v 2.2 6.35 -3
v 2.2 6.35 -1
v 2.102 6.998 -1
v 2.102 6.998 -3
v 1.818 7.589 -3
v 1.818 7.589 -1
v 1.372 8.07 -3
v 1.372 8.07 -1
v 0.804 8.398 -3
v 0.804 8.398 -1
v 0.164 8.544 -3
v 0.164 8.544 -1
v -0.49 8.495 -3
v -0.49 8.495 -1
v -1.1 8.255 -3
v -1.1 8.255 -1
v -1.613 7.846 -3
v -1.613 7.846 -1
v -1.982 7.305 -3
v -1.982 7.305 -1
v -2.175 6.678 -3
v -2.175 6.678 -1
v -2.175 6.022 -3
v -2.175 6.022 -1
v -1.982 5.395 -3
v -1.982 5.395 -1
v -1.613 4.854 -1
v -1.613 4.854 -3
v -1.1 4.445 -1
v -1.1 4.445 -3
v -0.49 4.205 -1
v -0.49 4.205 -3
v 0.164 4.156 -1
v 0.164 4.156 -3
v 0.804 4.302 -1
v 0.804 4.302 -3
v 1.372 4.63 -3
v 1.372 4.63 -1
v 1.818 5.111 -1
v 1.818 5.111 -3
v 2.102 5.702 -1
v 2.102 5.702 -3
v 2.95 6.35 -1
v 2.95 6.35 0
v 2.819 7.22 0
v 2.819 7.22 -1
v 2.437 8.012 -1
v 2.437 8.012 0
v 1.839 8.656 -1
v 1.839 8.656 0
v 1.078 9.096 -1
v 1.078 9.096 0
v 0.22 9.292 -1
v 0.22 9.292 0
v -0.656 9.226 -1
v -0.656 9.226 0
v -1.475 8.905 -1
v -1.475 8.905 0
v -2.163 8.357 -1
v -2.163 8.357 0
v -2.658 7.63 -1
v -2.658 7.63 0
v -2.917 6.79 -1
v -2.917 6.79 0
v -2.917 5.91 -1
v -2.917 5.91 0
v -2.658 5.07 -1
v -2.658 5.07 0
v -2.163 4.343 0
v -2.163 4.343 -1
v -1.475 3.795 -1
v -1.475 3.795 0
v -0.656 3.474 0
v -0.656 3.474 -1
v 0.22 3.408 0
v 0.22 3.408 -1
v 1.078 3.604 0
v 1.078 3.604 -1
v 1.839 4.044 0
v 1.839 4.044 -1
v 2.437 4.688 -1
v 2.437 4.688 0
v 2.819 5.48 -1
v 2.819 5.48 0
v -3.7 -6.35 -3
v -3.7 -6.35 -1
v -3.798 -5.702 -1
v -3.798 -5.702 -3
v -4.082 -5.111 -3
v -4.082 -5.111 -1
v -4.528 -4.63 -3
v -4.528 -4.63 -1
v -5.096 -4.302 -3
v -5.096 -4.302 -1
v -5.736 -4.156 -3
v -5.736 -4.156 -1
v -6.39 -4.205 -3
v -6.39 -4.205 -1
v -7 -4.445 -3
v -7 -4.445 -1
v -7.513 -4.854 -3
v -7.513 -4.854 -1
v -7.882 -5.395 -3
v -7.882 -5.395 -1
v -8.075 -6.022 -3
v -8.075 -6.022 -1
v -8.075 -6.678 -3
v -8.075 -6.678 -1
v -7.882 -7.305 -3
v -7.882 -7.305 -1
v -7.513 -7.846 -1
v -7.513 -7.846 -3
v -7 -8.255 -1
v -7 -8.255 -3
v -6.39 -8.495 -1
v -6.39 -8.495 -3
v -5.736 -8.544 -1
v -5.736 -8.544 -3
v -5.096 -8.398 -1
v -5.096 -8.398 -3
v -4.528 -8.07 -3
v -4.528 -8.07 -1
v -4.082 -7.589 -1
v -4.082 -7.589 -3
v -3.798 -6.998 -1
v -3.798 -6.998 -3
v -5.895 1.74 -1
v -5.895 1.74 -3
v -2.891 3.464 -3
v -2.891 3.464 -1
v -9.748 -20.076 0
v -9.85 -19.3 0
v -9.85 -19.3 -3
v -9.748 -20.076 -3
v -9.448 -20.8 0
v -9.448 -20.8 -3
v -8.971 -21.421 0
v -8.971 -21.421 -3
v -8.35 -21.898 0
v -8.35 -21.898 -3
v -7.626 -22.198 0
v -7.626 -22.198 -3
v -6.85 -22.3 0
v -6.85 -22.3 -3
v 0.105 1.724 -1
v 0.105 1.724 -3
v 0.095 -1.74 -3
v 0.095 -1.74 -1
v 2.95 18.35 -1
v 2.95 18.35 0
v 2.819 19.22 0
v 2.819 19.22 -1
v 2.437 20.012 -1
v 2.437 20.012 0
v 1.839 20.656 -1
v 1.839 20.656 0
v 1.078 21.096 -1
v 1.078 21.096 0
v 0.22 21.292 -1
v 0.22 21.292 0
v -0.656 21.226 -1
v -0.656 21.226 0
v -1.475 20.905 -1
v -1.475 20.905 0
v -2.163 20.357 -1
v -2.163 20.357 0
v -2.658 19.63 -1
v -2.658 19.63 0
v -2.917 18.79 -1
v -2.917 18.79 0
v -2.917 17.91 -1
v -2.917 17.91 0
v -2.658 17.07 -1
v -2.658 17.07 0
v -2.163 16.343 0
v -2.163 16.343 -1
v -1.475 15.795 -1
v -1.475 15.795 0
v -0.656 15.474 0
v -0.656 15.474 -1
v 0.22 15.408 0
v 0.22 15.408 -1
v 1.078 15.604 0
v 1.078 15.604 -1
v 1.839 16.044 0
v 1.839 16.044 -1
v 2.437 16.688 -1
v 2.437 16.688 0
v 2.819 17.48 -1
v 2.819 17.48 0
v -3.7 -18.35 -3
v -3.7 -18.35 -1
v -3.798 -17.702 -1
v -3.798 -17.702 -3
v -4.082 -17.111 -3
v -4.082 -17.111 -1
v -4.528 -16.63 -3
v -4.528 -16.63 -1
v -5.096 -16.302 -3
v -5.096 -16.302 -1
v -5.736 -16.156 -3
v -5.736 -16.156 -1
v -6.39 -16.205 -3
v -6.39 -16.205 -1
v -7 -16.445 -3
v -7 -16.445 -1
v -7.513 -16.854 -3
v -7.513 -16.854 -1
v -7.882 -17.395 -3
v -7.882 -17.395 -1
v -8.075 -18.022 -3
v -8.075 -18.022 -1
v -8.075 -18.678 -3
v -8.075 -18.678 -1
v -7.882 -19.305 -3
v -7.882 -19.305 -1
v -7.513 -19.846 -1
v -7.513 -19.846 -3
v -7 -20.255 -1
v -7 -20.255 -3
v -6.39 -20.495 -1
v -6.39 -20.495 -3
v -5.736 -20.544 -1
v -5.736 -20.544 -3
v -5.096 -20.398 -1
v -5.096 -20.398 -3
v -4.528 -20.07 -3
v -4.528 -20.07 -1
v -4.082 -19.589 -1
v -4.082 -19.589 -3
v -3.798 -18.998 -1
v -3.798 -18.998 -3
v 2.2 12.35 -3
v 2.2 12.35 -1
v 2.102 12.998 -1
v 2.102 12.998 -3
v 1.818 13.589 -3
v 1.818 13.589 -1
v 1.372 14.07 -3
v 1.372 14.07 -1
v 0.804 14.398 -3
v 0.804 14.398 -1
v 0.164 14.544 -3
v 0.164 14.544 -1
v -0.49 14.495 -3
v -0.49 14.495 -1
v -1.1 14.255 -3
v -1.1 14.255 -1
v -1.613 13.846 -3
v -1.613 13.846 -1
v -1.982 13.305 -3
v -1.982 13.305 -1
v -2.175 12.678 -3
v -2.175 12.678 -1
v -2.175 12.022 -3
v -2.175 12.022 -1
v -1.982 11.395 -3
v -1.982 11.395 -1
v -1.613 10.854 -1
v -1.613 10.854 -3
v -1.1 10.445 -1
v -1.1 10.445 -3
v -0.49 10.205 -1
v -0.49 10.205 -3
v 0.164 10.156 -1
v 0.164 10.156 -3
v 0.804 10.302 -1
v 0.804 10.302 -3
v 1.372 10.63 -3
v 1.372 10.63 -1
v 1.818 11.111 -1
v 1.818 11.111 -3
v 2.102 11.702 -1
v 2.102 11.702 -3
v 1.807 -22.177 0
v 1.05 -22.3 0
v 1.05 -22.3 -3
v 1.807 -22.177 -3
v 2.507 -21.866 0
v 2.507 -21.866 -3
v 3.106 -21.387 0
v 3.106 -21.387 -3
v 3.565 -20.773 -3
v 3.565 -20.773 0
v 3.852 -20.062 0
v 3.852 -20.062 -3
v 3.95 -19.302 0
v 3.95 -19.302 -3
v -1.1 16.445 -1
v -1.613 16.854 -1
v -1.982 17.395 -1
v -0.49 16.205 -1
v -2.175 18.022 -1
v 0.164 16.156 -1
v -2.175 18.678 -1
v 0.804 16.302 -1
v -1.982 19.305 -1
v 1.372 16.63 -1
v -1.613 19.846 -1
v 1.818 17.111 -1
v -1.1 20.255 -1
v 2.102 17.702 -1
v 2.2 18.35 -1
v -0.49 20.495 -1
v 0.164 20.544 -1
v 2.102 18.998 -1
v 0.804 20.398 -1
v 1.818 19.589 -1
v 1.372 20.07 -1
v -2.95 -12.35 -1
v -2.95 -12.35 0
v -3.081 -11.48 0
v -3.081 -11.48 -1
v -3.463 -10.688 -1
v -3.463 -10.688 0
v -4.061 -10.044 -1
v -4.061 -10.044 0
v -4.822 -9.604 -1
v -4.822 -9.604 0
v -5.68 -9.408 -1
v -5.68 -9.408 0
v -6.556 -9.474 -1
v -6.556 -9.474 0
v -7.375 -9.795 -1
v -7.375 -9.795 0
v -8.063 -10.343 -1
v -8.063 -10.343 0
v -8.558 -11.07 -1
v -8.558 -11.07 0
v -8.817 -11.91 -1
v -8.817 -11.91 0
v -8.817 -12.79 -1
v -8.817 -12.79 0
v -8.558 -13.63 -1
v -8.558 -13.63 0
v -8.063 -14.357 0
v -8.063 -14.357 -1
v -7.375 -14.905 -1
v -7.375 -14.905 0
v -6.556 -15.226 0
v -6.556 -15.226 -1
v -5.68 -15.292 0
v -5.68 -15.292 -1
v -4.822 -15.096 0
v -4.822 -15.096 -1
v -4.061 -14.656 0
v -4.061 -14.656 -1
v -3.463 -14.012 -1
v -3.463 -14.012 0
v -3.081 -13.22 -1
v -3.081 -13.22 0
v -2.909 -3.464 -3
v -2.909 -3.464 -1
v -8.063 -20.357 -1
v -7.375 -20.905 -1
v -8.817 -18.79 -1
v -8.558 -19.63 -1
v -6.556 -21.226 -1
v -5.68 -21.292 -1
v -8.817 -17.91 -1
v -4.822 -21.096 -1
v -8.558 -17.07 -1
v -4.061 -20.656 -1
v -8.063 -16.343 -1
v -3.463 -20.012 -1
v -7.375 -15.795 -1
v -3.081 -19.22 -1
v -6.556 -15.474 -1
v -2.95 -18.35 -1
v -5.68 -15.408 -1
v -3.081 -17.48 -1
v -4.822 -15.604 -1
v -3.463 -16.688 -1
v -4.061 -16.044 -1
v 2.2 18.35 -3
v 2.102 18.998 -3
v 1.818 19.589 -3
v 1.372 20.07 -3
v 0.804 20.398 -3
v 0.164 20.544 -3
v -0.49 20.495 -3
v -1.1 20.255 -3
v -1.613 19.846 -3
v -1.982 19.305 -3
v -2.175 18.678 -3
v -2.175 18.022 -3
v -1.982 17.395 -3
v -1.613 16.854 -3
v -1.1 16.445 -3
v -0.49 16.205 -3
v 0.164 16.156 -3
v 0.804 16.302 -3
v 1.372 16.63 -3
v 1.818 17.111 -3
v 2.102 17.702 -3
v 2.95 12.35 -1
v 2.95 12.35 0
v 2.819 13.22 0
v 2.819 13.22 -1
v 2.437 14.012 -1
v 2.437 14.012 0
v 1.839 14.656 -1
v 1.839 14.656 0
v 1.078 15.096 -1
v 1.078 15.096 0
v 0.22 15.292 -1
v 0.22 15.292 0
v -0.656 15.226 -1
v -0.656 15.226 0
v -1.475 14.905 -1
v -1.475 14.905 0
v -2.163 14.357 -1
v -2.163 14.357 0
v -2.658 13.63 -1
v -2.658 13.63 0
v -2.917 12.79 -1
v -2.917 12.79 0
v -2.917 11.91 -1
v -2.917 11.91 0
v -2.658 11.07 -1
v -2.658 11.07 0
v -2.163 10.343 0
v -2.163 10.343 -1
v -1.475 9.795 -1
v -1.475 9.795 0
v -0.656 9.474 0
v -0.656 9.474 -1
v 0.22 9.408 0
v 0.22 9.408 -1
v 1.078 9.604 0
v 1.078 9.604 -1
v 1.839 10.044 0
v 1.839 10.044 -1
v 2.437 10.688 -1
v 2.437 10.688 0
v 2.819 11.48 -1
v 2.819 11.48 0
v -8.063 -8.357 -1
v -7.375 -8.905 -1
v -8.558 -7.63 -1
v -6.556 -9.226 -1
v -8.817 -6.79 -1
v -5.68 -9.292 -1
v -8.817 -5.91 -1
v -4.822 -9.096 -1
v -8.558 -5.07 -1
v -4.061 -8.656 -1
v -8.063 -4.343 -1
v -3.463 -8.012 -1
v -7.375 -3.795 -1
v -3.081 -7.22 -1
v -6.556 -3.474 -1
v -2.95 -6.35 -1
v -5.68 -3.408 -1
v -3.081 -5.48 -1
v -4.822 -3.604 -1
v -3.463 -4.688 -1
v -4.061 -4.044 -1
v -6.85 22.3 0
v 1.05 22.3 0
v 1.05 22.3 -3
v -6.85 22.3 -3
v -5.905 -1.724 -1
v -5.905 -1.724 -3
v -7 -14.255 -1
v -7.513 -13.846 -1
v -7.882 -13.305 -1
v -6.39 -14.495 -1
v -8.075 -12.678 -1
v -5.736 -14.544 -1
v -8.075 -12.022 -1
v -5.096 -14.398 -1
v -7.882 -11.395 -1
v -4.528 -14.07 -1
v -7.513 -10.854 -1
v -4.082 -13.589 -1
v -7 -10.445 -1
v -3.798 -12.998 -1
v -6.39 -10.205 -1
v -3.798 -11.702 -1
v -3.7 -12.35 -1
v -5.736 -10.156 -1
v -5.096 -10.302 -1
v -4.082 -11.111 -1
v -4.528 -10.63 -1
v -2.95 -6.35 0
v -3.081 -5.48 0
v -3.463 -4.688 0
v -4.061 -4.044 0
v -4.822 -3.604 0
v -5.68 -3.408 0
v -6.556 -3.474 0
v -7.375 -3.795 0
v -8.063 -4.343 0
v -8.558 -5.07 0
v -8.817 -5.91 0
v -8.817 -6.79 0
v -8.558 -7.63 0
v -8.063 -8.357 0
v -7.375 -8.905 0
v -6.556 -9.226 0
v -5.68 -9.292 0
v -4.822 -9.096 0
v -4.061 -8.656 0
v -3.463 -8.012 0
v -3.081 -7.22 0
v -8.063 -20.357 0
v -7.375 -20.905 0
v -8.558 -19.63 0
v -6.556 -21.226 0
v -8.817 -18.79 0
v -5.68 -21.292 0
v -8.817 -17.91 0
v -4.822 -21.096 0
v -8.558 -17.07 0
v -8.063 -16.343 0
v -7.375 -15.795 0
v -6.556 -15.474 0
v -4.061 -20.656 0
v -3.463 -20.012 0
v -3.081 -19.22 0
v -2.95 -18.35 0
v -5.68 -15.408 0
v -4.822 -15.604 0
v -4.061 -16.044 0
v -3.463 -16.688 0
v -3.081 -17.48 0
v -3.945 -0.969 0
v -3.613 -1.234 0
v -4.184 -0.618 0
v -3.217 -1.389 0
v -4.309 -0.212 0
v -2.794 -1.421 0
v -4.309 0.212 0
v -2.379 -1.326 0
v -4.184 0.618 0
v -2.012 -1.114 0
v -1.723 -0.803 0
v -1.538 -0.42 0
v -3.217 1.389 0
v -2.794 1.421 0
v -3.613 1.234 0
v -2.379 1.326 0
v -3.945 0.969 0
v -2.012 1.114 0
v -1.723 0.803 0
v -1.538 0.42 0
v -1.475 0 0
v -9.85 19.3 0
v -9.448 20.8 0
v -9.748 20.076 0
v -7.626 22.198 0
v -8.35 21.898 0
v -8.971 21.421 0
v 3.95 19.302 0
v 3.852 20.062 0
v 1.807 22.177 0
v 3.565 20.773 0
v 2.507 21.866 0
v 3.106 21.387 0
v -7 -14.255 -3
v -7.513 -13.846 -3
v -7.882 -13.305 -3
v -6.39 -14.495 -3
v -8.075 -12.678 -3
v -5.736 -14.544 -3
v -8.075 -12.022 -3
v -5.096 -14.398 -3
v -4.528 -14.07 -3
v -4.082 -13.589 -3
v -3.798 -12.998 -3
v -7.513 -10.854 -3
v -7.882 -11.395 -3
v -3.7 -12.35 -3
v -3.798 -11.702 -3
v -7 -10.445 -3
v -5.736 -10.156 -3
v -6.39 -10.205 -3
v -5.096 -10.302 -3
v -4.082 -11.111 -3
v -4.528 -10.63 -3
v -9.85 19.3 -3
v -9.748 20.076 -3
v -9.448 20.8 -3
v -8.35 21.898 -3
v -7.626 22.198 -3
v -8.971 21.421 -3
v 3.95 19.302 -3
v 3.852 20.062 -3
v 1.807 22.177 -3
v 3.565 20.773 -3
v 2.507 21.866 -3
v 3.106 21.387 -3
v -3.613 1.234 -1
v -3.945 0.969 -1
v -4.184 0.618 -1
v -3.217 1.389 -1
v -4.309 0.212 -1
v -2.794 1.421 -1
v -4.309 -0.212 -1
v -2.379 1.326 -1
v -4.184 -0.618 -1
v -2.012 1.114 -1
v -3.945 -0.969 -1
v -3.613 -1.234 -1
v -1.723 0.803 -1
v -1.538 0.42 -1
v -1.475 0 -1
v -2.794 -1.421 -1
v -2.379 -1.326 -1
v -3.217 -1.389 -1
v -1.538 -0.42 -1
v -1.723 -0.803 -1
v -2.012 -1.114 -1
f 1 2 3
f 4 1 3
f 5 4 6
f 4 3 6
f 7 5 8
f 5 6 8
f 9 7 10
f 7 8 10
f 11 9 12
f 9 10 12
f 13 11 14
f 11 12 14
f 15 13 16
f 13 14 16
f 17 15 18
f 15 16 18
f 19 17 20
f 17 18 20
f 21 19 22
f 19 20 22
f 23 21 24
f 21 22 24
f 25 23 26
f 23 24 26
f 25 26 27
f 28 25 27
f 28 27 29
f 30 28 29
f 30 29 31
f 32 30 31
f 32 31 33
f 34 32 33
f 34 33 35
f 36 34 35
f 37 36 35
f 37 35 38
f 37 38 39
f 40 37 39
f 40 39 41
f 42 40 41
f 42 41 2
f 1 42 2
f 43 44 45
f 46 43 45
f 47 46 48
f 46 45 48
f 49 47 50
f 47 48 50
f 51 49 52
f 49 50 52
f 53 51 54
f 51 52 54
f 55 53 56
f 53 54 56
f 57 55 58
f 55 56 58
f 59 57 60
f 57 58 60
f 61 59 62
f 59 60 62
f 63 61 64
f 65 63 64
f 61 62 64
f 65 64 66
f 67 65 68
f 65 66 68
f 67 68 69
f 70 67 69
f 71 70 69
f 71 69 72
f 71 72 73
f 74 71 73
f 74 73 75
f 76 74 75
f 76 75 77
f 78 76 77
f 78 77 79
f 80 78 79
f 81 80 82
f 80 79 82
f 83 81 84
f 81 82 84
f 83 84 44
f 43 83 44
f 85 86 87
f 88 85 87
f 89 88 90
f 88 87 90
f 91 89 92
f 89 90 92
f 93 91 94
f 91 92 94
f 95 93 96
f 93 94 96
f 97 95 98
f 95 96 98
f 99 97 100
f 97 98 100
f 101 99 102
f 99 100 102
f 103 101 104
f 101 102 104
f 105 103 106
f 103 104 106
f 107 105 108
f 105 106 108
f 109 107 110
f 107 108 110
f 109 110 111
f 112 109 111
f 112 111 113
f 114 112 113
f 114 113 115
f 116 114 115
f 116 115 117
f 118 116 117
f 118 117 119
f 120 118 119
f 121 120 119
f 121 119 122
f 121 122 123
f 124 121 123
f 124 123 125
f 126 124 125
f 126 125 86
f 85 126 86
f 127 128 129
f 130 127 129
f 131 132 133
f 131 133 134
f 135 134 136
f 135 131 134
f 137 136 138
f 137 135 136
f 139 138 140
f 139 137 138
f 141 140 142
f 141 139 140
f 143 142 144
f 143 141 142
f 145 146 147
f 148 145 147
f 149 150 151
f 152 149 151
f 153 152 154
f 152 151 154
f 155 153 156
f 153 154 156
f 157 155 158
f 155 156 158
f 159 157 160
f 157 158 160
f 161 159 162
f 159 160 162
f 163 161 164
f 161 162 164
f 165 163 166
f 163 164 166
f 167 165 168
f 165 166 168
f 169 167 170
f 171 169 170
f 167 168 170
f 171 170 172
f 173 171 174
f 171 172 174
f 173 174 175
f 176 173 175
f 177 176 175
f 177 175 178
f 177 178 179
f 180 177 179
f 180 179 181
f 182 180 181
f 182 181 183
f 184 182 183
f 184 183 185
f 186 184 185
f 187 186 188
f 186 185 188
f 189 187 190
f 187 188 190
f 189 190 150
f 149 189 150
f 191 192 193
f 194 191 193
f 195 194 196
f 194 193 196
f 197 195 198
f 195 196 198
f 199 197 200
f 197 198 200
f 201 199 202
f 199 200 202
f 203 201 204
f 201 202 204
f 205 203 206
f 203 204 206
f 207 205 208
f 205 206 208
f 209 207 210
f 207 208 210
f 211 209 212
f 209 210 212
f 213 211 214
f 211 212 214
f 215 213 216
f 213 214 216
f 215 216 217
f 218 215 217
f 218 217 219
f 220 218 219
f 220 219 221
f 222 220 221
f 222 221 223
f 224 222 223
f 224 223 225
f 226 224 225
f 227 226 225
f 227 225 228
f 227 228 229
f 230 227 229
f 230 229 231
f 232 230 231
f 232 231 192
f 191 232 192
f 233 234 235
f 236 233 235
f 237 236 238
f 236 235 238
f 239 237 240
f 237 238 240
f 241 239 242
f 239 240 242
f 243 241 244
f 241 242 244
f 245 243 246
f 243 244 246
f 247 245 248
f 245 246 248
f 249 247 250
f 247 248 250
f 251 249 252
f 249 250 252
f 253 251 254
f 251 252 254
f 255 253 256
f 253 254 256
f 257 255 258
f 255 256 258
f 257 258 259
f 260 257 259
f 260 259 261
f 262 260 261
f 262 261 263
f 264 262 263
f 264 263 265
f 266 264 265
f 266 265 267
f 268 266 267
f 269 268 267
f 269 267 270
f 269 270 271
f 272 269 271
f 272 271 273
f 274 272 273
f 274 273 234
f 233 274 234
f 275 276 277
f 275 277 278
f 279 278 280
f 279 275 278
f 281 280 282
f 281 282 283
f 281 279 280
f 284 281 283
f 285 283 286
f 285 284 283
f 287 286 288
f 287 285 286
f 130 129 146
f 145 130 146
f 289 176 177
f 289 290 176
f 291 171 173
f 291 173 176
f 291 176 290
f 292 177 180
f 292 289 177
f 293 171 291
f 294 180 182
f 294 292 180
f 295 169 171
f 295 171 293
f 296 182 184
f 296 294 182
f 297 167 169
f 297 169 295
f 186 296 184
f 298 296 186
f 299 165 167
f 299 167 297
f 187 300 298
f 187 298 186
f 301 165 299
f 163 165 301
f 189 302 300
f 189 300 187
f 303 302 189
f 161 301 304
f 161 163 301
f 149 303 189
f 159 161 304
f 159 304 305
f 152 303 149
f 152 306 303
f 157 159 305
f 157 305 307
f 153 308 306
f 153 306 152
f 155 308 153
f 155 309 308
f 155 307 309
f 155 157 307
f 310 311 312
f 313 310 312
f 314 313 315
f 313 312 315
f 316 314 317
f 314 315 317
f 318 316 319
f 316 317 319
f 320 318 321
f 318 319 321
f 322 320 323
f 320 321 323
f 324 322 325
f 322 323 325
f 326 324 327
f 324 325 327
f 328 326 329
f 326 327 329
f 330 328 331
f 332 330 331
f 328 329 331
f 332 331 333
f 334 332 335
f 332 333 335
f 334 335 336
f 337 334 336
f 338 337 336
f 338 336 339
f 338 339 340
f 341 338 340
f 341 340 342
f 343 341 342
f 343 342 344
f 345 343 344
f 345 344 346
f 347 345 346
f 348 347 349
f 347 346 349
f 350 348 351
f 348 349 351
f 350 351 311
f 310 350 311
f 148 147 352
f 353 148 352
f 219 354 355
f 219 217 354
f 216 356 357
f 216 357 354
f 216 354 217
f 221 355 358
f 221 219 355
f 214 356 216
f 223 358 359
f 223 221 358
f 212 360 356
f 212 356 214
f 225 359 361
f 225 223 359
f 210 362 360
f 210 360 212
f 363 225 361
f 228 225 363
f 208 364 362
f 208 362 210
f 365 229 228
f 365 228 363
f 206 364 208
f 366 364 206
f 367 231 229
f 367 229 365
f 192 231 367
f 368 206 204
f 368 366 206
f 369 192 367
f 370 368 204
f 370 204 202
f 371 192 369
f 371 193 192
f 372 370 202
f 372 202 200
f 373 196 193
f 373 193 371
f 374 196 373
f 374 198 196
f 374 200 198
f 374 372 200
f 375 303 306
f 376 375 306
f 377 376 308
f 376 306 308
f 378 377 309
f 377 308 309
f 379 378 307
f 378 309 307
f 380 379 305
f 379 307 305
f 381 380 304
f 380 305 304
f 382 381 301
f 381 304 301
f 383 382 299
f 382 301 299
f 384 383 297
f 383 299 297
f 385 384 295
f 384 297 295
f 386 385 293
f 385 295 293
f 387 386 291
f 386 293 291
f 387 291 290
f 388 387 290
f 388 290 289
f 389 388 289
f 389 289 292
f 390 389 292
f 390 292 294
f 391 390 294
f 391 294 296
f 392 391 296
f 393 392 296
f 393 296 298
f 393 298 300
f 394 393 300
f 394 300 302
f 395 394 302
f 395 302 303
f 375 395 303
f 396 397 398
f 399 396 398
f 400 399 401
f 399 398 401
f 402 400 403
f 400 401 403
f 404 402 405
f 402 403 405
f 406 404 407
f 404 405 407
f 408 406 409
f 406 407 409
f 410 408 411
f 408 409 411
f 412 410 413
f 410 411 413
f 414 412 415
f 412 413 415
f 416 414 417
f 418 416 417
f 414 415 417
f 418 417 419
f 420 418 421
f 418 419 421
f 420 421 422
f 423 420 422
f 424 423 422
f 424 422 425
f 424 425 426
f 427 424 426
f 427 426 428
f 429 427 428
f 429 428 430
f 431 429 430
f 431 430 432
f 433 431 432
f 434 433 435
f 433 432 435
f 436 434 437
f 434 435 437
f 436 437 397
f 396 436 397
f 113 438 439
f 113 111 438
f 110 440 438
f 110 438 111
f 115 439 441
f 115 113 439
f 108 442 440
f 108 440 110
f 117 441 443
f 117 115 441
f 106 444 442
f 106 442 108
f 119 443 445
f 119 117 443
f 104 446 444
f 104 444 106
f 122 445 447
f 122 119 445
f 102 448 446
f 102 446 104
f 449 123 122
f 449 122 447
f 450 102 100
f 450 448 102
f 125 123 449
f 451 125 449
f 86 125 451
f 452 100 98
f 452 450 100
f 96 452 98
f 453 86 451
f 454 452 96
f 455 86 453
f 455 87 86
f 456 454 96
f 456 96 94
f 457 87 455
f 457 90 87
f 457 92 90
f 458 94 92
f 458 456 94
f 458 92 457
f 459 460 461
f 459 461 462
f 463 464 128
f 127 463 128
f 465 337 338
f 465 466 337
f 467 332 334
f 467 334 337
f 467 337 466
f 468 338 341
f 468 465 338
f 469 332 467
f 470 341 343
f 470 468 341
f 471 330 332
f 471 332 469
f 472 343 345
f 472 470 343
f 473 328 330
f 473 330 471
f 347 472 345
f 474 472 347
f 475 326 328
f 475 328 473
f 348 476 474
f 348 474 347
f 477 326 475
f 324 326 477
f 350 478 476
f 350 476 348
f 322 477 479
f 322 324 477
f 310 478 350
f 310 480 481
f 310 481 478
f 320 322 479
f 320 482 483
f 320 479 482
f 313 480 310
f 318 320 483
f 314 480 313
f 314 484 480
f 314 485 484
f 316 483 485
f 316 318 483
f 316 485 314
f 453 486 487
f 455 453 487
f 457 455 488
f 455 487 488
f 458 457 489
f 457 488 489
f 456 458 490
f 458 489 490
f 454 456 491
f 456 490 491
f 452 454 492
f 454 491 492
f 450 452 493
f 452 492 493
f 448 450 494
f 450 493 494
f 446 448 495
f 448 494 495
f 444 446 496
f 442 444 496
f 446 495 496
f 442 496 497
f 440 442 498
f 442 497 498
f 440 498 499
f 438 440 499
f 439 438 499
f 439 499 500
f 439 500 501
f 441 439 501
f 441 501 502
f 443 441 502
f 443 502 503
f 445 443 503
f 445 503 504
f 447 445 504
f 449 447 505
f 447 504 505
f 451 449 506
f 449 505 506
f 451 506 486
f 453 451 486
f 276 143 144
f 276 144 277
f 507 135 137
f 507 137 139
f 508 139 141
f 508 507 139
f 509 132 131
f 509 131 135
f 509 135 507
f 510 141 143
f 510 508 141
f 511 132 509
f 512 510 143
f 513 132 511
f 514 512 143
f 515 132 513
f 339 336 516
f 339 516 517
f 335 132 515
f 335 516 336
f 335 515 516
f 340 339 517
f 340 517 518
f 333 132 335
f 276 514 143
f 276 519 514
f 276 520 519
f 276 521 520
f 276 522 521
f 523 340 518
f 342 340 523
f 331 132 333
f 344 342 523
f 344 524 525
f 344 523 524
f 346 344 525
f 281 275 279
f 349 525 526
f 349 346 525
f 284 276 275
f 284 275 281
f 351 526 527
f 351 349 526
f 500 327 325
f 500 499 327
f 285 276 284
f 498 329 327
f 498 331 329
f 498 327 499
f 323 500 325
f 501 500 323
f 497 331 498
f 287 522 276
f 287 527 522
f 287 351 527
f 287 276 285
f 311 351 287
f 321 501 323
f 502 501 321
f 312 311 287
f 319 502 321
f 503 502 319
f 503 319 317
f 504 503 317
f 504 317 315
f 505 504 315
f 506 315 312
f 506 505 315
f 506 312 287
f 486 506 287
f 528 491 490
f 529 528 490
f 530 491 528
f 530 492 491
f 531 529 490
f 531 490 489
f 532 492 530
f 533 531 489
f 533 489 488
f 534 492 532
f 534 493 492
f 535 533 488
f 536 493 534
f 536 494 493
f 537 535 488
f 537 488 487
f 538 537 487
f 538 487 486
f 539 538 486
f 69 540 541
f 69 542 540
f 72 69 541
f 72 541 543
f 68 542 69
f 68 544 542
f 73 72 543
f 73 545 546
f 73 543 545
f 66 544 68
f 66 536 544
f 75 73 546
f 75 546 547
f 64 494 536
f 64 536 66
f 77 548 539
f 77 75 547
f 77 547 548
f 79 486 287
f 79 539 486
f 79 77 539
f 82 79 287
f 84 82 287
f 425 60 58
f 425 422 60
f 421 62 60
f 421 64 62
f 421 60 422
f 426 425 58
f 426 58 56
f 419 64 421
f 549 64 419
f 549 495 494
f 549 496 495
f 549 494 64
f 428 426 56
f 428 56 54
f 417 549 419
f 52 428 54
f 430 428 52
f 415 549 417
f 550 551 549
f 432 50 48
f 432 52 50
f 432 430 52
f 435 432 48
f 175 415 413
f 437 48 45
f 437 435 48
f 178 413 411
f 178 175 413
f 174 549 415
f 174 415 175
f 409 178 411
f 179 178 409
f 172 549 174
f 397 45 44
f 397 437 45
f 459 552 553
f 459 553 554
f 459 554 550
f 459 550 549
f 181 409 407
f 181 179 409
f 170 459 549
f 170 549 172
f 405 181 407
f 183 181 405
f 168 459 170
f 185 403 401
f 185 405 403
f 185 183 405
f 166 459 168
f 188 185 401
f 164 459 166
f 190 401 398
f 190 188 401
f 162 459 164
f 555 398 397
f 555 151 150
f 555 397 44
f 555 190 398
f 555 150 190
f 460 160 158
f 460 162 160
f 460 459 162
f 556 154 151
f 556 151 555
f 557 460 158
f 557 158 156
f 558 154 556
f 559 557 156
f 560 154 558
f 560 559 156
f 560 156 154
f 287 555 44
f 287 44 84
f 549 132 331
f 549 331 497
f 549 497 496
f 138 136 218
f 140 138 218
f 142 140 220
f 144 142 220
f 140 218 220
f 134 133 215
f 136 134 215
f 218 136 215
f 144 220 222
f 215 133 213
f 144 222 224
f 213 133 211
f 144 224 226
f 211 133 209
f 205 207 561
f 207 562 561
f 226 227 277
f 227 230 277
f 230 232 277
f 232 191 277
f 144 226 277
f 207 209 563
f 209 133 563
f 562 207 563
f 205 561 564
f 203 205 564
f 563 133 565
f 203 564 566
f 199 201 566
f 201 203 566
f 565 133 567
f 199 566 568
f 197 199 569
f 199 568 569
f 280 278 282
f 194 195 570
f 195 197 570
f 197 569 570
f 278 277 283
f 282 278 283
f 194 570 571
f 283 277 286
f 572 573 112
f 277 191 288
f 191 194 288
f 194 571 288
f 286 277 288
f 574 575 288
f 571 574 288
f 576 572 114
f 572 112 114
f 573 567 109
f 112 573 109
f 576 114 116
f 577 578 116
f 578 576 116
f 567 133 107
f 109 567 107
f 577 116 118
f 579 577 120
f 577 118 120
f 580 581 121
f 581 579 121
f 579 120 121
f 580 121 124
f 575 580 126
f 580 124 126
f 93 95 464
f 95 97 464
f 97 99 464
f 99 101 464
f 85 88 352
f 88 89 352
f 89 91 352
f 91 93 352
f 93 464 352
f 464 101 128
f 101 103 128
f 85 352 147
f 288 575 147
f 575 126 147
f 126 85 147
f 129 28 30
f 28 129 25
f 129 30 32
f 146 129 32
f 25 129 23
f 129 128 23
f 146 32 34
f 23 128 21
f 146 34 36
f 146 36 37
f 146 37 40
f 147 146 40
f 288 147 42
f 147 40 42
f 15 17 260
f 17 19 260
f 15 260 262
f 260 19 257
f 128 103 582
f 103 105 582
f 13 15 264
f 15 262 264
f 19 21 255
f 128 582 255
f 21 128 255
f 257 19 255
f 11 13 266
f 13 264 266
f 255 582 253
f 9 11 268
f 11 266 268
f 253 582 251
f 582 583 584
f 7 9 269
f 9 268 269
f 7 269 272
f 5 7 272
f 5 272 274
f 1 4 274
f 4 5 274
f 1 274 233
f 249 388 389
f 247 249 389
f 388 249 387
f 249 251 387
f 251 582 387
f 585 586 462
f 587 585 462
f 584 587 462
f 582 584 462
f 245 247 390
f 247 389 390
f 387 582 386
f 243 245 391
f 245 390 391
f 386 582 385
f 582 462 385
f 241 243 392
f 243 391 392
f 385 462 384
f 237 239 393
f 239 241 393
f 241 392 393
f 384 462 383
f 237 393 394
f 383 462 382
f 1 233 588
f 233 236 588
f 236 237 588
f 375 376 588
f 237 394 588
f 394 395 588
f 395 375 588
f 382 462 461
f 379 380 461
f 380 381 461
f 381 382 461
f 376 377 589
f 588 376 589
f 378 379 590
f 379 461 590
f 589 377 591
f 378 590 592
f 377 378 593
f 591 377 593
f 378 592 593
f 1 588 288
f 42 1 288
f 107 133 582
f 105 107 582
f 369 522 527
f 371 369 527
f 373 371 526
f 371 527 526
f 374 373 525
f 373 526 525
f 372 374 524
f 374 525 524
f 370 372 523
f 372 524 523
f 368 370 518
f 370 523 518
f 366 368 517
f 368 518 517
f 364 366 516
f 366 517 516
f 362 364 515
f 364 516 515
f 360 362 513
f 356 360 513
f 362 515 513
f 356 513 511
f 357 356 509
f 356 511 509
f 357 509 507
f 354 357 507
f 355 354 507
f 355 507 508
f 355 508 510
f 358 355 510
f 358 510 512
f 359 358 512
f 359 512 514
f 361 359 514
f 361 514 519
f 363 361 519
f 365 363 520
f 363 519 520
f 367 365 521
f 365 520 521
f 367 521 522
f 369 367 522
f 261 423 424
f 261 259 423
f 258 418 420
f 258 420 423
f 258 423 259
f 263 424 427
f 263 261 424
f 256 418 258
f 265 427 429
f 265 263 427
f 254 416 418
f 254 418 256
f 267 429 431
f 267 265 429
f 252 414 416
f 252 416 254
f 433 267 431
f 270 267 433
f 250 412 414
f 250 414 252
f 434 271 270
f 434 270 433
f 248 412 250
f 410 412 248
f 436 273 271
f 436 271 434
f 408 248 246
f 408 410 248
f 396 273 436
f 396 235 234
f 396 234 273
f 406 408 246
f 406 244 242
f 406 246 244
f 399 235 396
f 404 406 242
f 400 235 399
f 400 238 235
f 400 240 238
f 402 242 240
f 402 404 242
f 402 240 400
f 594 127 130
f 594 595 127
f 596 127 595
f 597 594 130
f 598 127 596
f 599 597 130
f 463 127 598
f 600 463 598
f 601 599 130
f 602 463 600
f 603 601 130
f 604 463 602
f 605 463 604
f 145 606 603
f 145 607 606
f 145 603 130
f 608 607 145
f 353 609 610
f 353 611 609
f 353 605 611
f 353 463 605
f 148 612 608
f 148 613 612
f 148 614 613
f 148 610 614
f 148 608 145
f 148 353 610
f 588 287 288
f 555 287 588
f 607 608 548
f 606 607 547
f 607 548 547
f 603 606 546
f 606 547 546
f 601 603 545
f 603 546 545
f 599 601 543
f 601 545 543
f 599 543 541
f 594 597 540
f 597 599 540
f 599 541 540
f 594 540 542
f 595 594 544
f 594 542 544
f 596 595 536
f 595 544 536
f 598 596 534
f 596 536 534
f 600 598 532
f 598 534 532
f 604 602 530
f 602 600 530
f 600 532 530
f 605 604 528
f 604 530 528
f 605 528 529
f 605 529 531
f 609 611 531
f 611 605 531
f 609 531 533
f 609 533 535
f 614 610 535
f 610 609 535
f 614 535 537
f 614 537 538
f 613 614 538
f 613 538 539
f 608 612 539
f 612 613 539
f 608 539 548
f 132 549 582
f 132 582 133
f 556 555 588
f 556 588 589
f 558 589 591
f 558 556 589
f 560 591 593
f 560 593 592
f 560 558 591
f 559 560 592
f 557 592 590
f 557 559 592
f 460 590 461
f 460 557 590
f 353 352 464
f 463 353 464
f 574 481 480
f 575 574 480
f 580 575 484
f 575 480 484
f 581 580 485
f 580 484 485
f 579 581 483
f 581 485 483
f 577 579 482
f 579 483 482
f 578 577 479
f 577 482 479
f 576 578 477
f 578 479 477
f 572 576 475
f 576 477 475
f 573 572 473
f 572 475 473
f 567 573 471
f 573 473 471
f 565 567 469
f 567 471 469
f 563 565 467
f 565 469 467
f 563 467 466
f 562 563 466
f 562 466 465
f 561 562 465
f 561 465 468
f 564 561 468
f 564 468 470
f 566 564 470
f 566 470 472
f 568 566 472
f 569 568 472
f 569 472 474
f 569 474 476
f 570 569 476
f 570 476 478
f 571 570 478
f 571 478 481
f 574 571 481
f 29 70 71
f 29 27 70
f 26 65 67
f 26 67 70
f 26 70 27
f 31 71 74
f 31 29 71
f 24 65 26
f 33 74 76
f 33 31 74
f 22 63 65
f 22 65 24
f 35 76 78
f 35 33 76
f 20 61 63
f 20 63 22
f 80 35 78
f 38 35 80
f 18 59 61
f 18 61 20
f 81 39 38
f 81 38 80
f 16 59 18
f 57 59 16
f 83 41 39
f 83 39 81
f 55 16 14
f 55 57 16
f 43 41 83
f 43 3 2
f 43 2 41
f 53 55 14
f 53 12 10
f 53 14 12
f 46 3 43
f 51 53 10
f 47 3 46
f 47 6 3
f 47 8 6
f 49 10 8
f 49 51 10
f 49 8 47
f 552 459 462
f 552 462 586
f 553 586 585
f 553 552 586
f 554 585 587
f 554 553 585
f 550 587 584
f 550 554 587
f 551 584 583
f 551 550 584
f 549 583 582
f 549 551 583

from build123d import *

# Parameters (mm, degrees)
F0_R     = 2.95
F0_R_2   = 2.2
F0_R_3   = 1.425
F1_DEPTH = 3
F2_DEPTH = 1
F3_R     = 1.425
F4_DEPTH = 2


with BuildPart() as f1:
    # F0 (on Top) → F1 (new body)
    with BuildSketch(Plane.XY):
        with BuildLine():
            Line((3.95, -19.301667), (3.95, 0))
            Line((3.95, 0), (3.95, 19.301667))
            ThreePointArc((3.95, 19.301667), (3.106386, 21.387332), (1.05, 22.3))
            Line((1.05, 22.3), (-6.85, 22.3))
            ThreePointArc((-6.85, 22.3), (-8.97132, 21.42132), (-9.85, 19.3))
            Line((-9.85, 19.3), (-9.85, 0))
            Line((-9.85, 0), (-9.85, -19.3))
            ThreePointArc((-9.85, -19.3), (-8.97132, -21.42132), (-6.85, -22.3))
            Line((-6.85, -22.3), (1.05, -22.3))
            ThreePointArc((1.05, -22.3), (3.106386, -21.387332), (3.95, -19.301667))
        make_face()
        with Locations((-5.9, -18.35)):
            Circle(F0_R, mode=Mode.SUBTRACT)
        with Locations((-5.9, -12.35)):
            Circle(F0_R, mode=Mode.SUBTRACT)
        with Locations((-5.9, -6.35)):
            Circle(F0_R, mode=Mode.SUBTRACT)
        Polygon((0.082537, 1.761952), (0.117164, -1.701977), (-2.865373, -3.463929), (-5.882537, -1.761952), (-5.917164, 1.701977), (-2.934627, 3.463929), align=None, mode=Mode.SUBTRACT)
        with Locations((0, 6.35)):
            Circle(F0_R, mode=Mode.SUBTRACT)
        with Locations((0, 12.35)):
            Circle(F0_R, mode=Mode.SUBTRACT)
        with Locations((0, 18.35)):
            Circle(F0_R, mode=Mode.SUBTRACT)
        with Locations((0, 18.35)):
            Circle(F0_R)
        with Locations((0, 18.35)):
            Circle(F0_R_2, mode=Mode.SUBTRACT)
        with Locations((0, 12.35)):
            Circle(F0_R)
        with Locations((0, 12.35)):
            Circle(F0_R_2, mode=Mode.SUBTRACT)
        Polygon((-2.865373, -3.463929), (0.117164, -1.701977), (0.082537, 1.761952), (-2.934627, 3.463929), (-5.917164, 1.701977), (-5.882537, -1.761952), align=None)
        with Locations((-2.9, 0)):
            Circle(F0_R_3, mode=Mode.SUBTRACT)
        with Locations((-5.9, -6.35)):
            Circle(F0_R)
        with Locations((-5.9, -6.35)):
            Circle(F0_R_2, mode=Mode.SUBTRACT)
        with Locations((-5.9, -12.35)):
            Circle(F0_R)
        with Locations((-5.9, -12.35)):
            Circle(F0_R_2, mode=Mode.SUBTRACT)
        with Locations((-5.9, -18.35)):
            Circle(F0_R)
        with Locations((-5.9, -18.35)):
            Circle(F0_R_2, mode=Mode.SUBTRACT)
        with Locations((0, 6.35)):
            Circle(F0_R)
        with Locations((0, 6.35)):
            Circle(F0_R_2, mode=Mode.SUBTRACT)
    extrude(amount=-F1_DEPTH)

    # F0 (on Top) → F2 (cut)
    with BuildSketch(Plane.XY):
        with Locations((-5.9, -6.35)):
            Circle(F0_R)
        with Locations((-5.9, -6.35)):
            Circle(F0_R_2, mode=Mode.SUBTRACT)
        with Locations((-5.9, -12.35)):
            Circle(F0_R)
        with Locations((-5.9, -12.35)):
            Circle(F0_R_2, mode=Mode.SUBTRACT)
        with Locations((-5.9, -18.35)):
            Circle(F0_R)
        with Locations((-5.9, -18.35)):
            Circle(F0_R_2, mode=Mode.SUBTRACT)
        with Locations((0, 18.35)):
            Circle(F0_R)
        with Locations((0, 18.35)):
            Circle(F0_R_2, mode=Mode.SUBTRACT)
        with Locations((0, 12.35)):
            Circle(F0_R)
        with Locations((0, 12.35)):
            Circle(F0_R_2, mode=Mode.SUBTRACT)
        with Locations((0, 6.35)):
            Circle(F0_R)
        with Locations((0, 6.35)):
            Circle(F0_R_2, mode=Mode.SUBTRACT)
    extrude(amount=-F2_DEPTH, mode=Mode.SUBTRACT)

    # F3 (on face) → F4 (cut)
    with BuildSketch(Plane(origin=(0, 0, -3), x_dir=(1, 0, 0), z_dir=(0, 0, -1))):
        Polygon((-2.890558, -3.464089), (0.10471, -1.723868), (0.095268, 1.740221), (-2.909442, 3.464089), (-5.90471, 1.723868), (-5.895268, -1.740221), align=None)
        with Locations((-2.9, 0)):
            Circle(F3_R, mode=Mode.SUBTRACT)
    extrude(amount=-F4_DEPTH, mode=Mode.SUBTRACT)


solid = f1.part
